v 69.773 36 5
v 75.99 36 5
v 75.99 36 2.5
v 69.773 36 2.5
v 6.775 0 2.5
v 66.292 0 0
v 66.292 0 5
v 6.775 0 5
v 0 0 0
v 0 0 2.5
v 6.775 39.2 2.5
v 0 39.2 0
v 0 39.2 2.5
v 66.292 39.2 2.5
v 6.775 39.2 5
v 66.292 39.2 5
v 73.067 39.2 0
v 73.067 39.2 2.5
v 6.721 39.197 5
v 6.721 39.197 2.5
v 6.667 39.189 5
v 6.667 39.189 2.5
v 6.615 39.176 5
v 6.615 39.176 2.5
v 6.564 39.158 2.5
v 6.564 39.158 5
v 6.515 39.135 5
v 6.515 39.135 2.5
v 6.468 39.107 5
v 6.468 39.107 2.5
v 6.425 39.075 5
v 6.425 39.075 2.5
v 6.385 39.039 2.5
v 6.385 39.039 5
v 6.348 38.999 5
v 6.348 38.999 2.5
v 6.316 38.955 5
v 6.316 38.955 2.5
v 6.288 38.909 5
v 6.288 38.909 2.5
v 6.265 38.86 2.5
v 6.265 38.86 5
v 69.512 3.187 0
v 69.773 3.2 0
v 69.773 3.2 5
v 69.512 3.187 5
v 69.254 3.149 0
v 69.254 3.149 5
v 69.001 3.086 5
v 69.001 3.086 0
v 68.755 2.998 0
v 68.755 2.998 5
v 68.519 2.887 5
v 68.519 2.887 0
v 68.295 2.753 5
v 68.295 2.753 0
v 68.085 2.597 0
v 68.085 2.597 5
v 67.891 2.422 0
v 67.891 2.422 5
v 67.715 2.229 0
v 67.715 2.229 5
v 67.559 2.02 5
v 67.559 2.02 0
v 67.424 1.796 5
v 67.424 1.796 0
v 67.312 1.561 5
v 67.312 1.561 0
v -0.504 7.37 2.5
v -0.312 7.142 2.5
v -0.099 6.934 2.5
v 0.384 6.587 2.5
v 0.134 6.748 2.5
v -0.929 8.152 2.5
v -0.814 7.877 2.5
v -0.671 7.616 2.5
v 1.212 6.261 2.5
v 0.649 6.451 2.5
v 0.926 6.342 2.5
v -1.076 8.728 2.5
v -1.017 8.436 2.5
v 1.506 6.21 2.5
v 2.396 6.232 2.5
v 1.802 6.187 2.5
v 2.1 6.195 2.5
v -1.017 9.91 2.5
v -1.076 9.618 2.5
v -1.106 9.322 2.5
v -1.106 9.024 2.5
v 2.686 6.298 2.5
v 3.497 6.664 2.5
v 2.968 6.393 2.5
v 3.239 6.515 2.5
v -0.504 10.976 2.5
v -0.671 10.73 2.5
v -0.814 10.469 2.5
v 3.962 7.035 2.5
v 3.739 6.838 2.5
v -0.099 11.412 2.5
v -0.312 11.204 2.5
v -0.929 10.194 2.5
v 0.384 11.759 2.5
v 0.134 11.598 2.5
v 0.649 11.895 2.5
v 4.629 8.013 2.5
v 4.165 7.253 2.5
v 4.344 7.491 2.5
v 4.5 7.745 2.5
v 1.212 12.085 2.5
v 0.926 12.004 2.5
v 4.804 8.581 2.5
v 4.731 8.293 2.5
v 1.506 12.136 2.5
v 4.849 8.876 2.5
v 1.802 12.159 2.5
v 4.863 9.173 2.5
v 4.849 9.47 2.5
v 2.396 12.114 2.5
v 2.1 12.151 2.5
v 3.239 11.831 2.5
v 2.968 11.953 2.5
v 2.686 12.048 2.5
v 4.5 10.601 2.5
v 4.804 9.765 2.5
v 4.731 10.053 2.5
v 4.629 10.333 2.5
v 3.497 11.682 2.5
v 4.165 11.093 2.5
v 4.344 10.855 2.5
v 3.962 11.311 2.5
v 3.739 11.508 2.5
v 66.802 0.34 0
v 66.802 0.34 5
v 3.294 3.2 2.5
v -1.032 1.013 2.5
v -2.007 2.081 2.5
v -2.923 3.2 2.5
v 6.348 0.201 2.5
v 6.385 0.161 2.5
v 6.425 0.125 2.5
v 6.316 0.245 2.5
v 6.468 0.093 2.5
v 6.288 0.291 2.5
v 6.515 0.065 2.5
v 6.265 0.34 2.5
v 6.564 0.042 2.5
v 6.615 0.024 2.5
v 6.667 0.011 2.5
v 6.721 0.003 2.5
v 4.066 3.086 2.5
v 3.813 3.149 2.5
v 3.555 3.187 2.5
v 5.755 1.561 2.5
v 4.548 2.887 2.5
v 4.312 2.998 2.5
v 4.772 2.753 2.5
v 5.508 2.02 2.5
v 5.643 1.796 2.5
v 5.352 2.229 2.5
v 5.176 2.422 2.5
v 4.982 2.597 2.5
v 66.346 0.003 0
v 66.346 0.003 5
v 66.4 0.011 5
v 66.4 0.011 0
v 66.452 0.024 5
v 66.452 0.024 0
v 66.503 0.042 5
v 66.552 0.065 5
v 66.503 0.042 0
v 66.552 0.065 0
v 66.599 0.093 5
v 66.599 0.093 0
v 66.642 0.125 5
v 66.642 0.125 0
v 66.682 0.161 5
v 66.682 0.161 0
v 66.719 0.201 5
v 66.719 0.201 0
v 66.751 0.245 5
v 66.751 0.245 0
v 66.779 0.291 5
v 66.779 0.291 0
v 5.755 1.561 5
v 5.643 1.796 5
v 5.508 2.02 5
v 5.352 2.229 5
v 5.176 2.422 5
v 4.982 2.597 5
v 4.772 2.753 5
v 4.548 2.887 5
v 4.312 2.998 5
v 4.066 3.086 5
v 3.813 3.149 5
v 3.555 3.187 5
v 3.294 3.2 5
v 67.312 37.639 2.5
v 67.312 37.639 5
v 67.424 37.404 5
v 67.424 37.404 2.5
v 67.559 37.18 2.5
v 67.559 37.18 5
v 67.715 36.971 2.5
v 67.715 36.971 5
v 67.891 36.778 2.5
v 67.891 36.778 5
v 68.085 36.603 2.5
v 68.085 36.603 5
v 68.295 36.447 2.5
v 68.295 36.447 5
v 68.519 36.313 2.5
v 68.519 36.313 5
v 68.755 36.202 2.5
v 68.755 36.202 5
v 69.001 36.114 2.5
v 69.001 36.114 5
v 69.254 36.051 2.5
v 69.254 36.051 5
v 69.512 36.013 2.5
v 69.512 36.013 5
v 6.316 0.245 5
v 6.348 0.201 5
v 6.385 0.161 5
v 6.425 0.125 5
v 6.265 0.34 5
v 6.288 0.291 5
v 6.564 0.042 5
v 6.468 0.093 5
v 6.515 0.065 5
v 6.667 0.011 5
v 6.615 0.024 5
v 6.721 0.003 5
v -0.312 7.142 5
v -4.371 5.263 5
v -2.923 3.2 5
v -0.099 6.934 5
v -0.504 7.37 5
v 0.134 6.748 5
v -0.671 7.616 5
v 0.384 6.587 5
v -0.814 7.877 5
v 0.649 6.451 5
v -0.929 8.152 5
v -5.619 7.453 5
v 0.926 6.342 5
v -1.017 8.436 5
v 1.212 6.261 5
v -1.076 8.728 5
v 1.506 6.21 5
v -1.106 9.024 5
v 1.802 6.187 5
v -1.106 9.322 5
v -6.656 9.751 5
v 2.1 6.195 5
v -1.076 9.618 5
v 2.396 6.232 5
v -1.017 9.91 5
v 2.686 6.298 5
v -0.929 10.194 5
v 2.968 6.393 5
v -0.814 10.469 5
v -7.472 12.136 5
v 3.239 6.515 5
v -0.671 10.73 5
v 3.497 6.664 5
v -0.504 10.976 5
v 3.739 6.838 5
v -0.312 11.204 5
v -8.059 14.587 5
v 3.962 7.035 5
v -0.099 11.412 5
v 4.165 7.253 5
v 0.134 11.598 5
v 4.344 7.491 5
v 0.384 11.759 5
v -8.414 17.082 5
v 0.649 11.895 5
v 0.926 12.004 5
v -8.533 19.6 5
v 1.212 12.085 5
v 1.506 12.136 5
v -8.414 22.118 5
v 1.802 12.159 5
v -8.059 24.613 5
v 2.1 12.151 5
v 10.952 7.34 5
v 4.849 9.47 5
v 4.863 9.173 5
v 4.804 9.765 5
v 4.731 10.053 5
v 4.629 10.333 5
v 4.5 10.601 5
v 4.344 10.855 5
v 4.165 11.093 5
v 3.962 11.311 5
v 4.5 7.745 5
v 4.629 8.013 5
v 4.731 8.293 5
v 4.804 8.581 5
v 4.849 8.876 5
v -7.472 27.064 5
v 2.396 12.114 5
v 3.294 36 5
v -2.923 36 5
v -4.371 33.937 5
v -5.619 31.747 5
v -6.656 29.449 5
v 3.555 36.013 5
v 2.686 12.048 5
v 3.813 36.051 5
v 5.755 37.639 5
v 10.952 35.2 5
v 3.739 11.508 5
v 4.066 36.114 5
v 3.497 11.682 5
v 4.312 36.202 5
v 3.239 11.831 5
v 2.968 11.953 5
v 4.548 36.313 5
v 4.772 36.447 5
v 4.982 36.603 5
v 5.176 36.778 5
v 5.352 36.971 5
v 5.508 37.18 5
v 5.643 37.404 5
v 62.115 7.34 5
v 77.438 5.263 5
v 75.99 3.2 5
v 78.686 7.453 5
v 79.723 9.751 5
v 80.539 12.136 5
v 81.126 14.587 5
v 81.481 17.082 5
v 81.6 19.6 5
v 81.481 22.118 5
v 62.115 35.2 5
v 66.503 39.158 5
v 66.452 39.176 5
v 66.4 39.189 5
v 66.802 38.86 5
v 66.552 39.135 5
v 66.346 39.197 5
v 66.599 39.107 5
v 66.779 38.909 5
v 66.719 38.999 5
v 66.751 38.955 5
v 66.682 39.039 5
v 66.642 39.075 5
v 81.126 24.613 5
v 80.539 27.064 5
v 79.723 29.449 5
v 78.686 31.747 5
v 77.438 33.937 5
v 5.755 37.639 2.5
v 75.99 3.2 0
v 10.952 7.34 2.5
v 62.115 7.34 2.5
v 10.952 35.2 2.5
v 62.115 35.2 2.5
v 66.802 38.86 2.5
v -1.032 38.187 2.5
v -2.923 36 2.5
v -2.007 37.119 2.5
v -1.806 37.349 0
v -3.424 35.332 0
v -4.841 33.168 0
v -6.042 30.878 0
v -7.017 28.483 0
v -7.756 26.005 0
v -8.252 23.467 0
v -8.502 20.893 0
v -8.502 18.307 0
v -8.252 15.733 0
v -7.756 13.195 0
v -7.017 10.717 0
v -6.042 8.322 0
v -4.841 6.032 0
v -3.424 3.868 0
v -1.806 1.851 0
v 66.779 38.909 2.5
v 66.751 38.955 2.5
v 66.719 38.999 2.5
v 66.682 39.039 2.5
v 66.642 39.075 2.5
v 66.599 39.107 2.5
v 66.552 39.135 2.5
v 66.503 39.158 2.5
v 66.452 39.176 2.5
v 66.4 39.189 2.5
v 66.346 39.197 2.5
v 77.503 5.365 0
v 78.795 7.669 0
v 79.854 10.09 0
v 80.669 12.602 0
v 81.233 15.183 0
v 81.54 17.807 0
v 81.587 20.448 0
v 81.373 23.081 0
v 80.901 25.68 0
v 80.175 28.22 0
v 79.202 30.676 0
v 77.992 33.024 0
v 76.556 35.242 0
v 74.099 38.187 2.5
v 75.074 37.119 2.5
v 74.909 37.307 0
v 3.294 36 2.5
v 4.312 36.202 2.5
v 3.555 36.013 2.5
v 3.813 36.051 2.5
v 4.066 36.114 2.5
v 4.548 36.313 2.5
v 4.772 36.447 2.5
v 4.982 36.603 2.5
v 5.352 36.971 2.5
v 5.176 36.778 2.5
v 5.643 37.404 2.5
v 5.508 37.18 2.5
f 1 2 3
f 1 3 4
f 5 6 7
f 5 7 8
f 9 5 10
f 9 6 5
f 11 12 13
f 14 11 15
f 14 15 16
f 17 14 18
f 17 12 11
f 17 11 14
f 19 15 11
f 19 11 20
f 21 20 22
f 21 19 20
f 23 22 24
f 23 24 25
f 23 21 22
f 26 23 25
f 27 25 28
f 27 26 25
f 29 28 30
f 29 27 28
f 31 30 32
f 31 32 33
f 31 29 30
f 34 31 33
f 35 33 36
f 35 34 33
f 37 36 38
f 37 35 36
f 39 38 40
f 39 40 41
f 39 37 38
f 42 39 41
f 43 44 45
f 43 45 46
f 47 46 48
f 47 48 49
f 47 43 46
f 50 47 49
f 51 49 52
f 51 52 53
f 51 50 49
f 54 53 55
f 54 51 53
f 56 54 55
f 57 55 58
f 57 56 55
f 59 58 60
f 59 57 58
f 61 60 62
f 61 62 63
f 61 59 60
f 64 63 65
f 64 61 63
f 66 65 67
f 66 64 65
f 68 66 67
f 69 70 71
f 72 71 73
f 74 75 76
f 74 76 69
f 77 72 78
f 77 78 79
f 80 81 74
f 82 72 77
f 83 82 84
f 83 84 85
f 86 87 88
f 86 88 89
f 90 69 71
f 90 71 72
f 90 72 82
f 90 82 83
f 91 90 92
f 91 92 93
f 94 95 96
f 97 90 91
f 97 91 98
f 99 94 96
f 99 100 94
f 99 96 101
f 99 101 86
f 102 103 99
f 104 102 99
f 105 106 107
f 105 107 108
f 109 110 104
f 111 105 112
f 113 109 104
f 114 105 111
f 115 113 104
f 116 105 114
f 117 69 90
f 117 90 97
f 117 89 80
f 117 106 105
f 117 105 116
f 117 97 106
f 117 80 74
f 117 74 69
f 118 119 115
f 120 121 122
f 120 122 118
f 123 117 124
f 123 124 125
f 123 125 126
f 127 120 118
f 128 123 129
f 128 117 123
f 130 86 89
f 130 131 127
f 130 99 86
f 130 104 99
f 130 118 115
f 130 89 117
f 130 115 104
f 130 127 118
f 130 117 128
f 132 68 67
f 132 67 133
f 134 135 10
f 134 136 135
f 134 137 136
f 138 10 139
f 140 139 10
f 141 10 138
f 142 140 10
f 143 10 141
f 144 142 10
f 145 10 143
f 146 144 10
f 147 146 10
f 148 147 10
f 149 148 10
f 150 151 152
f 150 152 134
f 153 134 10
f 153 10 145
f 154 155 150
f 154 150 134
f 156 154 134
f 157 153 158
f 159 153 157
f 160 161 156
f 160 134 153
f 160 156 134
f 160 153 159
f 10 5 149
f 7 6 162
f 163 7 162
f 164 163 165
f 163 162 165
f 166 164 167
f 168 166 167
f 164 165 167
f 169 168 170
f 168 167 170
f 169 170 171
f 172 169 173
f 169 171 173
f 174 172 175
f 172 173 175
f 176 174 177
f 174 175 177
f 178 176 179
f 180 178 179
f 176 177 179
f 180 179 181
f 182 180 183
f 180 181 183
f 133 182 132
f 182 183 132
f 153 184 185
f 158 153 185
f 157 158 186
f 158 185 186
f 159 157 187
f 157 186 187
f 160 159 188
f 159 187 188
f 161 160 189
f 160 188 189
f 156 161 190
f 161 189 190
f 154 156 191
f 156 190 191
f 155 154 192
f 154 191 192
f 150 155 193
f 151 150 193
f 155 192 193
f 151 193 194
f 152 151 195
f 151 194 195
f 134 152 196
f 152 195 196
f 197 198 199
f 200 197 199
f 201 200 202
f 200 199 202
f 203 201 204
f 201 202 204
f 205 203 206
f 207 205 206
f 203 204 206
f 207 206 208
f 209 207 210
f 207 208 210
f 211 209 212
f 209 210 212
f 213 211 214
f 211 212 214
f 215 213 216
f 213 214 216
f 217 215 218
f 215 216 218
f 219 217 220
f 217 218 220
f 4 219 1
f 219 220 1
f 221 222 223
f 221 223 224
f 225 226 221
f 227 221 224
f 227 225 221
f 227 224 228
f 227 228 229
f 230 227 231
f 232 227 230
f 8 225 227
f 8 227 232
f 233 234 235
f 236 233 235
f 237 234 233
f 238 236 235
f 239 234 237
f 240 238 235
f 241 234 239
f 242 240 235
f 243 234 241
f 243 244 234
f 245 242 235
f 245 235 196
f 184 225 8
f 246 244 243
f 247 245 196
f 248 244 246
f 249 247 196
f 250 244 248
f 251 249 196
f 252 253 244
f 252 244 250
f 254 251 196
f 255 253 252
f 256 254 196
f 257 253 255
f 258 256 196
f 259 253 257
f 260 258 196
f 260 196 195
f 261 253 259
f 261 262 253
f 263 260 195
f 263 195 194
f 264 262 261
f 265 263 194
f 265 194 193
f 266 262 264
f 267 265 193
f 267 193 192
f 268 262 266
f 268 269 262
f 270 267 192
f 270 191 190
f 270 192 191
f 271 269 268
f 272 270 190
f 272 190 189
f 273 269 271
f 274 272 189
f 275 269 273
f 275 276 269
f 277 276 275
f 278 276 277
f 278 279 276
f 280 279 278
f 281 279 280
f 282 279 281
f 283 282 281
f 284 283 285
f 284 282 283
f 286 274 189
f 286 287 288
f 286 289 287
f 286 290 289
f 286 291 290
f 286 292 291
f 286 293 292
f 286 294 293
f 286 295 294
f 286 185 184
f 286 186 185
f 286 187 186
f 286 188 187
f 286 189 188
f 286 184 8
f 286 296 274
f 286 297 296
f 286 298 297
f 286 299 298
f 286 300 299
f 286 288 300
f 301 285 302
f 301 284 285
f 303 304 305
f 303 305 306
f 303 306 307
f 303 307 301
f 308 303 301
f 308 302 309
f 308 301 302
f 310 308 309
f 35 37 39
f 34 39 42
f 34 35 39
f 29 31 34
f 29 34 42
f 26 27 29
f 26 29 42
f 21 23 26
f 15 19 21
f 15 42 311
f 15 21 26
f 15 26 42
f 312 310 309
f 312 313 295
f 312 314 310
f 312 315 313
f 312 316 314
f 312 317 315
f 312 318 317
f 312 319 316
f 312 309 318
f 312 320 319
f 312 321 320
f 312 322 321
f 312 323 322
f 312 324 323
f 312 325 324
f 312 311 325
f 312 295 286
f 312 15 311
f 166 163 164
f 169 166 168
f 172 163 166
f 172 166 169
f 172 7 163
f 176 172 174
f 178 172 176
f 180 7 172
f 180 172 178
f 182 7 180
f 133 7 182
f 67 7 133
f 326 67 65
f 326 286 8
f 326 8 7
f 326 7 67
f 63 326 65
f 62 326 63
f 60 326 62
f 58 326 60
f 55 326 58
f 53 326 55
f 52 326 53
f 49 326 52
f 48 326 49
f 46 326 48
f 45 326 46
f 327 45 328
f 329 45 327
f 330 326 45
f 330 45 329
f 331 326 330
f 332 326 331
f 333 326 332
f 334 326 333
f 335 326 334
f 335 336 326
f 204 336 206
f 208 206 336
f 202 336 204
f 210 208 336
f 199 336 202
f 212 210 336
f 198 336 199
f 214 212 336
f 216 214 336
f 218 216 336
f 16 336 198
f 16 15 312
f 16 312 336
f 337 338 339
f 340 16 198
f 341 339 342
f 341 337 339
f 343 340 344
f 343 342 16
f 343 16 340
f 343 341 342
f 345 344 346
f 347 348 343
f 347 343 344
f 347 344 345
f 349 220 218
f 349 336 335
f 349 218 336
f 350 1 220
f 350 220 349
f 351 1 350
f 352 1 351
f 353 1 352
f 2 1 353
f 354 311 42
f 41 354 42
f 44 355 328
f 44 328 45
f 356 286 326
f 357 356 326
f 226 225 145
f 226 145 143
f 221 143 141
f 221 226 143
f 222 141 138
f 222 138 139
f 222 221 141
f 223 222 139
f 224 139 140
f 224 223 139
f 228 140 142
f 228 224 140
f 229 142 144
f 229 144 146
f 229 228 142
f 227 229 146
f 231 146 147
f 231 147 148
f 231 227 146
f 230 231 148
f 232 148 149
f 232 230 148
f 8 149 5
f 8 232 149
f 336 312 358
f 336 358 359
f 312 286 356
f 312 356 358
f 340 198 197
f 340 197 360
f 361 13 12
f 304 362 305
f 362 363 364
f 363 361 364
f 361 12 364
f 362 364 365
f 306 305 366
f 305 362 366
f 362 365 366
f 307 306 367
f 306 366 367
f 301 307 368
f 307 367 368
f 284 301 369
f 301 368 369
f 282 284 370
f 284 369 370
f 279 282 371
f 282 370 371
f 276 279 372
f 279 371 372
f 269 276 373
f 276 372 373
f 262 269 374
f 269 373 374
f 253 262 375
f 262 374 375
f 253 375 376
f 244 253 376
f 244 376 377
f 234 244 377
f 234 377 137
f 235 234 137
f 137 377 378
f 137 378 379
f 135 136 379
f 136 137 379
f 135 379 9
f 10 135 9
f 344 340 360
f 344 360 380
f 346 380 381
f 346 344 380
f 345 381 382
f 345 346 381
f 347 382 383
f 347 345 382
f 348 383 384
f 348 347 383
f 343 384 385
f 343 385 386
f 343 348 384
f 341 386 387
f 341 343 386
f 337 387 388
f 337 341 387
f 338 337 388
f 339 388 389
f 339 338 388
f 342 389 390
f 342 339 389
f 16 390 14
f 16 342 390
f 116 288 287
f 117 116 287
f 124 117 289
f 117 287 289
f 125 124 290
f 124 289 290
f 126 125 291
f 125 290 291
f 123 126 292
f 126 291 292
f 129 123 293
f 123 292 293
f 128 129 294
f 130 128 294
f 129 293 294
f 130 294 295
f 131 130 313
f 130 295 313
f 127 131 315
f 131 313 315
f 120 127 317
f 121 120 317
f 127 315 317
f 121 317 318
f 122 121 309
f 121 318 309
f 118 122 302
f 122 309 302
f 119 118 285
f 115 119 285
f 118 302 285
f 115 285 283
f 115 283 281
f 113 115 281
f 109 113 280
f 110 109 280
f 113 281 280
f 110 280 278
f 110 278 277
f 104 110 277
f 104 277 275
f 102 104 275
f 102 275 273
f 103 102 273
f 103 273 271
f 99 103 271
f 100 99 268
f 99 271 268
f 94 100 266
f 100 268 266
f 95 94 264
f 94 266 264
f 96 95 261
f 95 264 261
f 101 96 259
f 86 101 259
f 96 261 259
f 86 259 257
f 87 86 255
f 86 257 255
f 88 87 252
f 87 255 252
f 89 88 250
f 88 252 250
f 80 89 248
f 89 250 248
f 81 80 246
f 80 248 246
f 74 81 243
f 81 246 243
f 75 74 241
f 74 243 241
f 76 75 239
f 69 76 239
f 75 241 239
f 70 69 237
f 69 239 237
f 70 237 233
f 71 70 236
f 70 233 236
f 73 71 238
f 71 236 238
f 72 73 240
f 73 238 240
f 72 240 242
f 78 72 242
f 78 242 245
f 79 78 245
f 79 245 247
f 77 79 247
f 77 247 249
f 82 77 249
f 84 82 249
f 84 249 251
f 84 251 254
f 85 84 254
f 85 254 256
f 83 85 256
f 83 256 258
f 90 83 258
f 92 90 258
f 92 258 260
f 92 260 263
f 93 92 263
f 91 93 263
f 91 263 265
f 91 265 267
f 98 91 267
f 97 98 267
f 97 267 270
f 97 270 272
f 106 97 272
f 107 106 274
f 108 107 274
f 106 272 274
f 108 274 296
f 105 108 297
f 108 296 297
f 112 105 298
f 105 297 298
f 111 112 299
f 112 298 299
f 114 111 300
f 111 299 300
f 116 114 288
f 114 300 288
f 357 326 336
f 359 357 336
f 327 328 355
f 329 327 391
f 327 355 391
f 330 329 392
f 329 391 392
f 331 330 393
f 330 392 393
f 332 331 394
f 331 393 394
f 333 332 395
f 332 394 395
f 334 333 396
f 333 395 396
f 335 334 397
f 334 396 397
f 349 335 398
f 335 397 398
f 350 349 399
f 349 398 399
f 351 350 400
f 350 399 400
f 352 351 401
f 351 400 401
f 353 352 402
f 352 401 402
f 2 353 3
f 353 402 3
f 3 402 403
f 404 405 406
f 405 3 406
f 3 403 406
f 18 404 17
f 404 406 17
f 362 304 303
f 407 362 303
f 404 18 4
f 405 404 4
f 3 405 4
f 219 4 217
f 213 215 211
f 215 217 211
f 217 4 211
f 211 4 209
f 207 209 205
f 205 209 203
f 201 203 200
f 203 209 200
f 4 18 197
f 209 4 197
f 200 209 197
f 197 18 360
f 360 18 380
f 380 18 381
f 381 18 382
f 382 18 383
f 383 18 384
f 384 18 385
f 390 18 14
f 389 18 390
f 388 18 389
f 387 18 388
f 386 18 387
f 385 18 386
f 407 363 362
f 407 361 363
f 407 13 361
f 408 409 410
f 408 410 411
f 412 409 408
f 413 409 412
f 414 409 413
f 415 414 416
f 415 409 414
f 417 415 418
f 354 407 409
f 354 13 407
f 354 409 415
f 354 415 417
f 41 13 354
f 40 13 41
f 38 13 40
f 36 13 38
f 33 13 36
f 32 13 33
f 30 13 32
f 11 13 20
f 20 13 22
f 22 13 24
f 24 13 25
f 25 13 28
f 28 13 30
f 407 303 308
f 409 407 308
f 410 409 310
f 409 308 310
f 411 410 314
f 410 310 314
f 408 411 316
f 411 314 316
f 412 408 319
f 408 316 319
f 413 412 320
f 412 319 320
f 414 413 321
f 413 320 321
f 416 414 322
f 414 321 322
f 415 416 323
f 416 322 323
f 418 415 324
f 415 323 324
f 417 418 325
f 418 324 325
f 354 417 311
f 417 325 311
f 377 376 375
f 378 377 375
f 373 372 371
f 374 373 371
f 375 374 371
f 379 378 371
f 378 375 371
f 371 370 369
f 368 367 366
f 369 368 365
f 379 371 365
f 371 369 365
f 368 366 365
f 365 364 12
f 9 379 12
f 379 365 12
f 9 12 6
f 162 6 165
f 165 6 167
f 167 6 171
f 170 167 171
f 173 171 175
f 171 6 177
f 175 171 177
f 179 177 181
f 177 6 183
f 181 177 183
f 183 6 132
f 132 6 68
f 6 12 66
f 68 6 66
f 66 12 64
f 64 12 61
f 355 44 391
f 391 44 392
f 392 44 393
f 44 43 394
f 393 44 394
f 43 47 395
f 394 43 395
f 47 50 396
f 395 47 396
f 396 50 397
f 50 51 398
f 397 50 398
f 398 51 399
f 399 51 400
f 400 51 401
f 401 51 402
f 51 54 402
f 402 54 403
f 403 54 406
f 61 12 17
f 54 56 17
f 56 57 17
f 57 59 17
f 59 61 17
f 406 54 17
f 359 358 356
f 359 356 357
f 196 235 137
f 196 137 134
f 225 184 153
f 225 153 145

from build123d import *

# Parameters (mm, degrees)
PAD_DEPTH       = 5
POCKET_DEPTH    = 2.5
SKETCH002_R     = 2.9865
SKETCH002_W     = 51.163146
SKETCH002_H     = 27.86
POCKET001_DEPTH = 2.5


with BuildPart() as part:
    # Sketch → Pad (new body)
    with BuildSketch(Plane.XY):
        with BuildLine():
            ThreePointArc((0, 39.2), (-8.533, 19.6), (0, 0))
            Line((66.291934, 0), (0, 0))
            ThreePointArc((66.291934, 0), (66.5985, 0.092754), (66.802226, 0.339902))
            Line((67.312043, 1.560727), (66.802226, 0.339902))
            ThreePointArc((69.773073, 3.2), (68.29457, 2.752666), (67.312043, 1.560727))
            Line((75.990073, 3.2), (69.773073, 3.2))
            ThreePointArc((75.990073, 3.2), (81.512166, 21.767046), (73.067, 39.2))
            Line((0, 39.2), (73.067, 39.2))
        make_face()
    extrude(amount=PAD_DEPTH)

    # Sketch001 (on Face10 of Pad) → Pocket (cut)
    with BuildSketch(Plane.XY.offset(5)):
        with BuildLine():
            Line((-2.923073, 36), (3.293927, 36))
            ThreePointArc((3.293927, 36), (4.77243, 36.447334), (5.754957, 37.639273))
            Line((5.754957, 37.639273), (6.264774, 38.860098))
            ThreePointArc((6.775066, 39.2), (6.4685, 39.107246), (6.264774, 38.860098))
            Line((-2.923073, 39.2), (6.775066, 39.2))
            Line((-2.923073, 39.2), (-2.923073, 36))
        make_face()
        with BuildLine():
            Line((75.990073, 36), (69.773073, 36))
            ThreePointArc((67.312043, 37.639273), (68.29457, 36.447334), (69.773073, 36))
            Line((67.312043, 37.639273), (66.802226, 38.860098))
            ThreePointArc((66.802226, 38.860098), (66.5985, 39.107246), (66.291934, 39.2))
            Line((66.291934, 39.2), (75.990073, 39.2))
            Line((75.990073, 39.2), (75.990073, 36))
        make_face()
        with BuildLine():
            Line((-2.923073, 3.2), (-2.923073, 0))
            Line((-2.923073, 0), (6.775066, 0))
            ThreePointArc((6.264774, 0.339902), (6.4685, 0.092754), (6.775066, 0))
            Line((5.754957, 1.560727), (6.264774, 0.339902))
            ThreePointArc((5.754957, 1.560727), (4.77243, 2.752666), (3.293927, 3.2))
            Line((-2.923073, 3.2), (3.293927, 3.2))
        make_face()
    extrude(amount=-POCKET_DEPTH, mode=Mode.SUBTRACT)

    # Sketch002 (on Face6 of Pocket) → Pocket001 (cut)
    with BuildSketch(Plane.XY.offset(5)):
        with Locations((1.876927, 9.173)):
            Circle(SKETCH002_R)
        with Locations((36.5335, 21.27)):
            Rectangle(SKETCH002_W, SKETCH002_H)
    extrude(amount=-POCKET001_DEPTH, mode=Mode.SUBTRACT)


solid = part.part
